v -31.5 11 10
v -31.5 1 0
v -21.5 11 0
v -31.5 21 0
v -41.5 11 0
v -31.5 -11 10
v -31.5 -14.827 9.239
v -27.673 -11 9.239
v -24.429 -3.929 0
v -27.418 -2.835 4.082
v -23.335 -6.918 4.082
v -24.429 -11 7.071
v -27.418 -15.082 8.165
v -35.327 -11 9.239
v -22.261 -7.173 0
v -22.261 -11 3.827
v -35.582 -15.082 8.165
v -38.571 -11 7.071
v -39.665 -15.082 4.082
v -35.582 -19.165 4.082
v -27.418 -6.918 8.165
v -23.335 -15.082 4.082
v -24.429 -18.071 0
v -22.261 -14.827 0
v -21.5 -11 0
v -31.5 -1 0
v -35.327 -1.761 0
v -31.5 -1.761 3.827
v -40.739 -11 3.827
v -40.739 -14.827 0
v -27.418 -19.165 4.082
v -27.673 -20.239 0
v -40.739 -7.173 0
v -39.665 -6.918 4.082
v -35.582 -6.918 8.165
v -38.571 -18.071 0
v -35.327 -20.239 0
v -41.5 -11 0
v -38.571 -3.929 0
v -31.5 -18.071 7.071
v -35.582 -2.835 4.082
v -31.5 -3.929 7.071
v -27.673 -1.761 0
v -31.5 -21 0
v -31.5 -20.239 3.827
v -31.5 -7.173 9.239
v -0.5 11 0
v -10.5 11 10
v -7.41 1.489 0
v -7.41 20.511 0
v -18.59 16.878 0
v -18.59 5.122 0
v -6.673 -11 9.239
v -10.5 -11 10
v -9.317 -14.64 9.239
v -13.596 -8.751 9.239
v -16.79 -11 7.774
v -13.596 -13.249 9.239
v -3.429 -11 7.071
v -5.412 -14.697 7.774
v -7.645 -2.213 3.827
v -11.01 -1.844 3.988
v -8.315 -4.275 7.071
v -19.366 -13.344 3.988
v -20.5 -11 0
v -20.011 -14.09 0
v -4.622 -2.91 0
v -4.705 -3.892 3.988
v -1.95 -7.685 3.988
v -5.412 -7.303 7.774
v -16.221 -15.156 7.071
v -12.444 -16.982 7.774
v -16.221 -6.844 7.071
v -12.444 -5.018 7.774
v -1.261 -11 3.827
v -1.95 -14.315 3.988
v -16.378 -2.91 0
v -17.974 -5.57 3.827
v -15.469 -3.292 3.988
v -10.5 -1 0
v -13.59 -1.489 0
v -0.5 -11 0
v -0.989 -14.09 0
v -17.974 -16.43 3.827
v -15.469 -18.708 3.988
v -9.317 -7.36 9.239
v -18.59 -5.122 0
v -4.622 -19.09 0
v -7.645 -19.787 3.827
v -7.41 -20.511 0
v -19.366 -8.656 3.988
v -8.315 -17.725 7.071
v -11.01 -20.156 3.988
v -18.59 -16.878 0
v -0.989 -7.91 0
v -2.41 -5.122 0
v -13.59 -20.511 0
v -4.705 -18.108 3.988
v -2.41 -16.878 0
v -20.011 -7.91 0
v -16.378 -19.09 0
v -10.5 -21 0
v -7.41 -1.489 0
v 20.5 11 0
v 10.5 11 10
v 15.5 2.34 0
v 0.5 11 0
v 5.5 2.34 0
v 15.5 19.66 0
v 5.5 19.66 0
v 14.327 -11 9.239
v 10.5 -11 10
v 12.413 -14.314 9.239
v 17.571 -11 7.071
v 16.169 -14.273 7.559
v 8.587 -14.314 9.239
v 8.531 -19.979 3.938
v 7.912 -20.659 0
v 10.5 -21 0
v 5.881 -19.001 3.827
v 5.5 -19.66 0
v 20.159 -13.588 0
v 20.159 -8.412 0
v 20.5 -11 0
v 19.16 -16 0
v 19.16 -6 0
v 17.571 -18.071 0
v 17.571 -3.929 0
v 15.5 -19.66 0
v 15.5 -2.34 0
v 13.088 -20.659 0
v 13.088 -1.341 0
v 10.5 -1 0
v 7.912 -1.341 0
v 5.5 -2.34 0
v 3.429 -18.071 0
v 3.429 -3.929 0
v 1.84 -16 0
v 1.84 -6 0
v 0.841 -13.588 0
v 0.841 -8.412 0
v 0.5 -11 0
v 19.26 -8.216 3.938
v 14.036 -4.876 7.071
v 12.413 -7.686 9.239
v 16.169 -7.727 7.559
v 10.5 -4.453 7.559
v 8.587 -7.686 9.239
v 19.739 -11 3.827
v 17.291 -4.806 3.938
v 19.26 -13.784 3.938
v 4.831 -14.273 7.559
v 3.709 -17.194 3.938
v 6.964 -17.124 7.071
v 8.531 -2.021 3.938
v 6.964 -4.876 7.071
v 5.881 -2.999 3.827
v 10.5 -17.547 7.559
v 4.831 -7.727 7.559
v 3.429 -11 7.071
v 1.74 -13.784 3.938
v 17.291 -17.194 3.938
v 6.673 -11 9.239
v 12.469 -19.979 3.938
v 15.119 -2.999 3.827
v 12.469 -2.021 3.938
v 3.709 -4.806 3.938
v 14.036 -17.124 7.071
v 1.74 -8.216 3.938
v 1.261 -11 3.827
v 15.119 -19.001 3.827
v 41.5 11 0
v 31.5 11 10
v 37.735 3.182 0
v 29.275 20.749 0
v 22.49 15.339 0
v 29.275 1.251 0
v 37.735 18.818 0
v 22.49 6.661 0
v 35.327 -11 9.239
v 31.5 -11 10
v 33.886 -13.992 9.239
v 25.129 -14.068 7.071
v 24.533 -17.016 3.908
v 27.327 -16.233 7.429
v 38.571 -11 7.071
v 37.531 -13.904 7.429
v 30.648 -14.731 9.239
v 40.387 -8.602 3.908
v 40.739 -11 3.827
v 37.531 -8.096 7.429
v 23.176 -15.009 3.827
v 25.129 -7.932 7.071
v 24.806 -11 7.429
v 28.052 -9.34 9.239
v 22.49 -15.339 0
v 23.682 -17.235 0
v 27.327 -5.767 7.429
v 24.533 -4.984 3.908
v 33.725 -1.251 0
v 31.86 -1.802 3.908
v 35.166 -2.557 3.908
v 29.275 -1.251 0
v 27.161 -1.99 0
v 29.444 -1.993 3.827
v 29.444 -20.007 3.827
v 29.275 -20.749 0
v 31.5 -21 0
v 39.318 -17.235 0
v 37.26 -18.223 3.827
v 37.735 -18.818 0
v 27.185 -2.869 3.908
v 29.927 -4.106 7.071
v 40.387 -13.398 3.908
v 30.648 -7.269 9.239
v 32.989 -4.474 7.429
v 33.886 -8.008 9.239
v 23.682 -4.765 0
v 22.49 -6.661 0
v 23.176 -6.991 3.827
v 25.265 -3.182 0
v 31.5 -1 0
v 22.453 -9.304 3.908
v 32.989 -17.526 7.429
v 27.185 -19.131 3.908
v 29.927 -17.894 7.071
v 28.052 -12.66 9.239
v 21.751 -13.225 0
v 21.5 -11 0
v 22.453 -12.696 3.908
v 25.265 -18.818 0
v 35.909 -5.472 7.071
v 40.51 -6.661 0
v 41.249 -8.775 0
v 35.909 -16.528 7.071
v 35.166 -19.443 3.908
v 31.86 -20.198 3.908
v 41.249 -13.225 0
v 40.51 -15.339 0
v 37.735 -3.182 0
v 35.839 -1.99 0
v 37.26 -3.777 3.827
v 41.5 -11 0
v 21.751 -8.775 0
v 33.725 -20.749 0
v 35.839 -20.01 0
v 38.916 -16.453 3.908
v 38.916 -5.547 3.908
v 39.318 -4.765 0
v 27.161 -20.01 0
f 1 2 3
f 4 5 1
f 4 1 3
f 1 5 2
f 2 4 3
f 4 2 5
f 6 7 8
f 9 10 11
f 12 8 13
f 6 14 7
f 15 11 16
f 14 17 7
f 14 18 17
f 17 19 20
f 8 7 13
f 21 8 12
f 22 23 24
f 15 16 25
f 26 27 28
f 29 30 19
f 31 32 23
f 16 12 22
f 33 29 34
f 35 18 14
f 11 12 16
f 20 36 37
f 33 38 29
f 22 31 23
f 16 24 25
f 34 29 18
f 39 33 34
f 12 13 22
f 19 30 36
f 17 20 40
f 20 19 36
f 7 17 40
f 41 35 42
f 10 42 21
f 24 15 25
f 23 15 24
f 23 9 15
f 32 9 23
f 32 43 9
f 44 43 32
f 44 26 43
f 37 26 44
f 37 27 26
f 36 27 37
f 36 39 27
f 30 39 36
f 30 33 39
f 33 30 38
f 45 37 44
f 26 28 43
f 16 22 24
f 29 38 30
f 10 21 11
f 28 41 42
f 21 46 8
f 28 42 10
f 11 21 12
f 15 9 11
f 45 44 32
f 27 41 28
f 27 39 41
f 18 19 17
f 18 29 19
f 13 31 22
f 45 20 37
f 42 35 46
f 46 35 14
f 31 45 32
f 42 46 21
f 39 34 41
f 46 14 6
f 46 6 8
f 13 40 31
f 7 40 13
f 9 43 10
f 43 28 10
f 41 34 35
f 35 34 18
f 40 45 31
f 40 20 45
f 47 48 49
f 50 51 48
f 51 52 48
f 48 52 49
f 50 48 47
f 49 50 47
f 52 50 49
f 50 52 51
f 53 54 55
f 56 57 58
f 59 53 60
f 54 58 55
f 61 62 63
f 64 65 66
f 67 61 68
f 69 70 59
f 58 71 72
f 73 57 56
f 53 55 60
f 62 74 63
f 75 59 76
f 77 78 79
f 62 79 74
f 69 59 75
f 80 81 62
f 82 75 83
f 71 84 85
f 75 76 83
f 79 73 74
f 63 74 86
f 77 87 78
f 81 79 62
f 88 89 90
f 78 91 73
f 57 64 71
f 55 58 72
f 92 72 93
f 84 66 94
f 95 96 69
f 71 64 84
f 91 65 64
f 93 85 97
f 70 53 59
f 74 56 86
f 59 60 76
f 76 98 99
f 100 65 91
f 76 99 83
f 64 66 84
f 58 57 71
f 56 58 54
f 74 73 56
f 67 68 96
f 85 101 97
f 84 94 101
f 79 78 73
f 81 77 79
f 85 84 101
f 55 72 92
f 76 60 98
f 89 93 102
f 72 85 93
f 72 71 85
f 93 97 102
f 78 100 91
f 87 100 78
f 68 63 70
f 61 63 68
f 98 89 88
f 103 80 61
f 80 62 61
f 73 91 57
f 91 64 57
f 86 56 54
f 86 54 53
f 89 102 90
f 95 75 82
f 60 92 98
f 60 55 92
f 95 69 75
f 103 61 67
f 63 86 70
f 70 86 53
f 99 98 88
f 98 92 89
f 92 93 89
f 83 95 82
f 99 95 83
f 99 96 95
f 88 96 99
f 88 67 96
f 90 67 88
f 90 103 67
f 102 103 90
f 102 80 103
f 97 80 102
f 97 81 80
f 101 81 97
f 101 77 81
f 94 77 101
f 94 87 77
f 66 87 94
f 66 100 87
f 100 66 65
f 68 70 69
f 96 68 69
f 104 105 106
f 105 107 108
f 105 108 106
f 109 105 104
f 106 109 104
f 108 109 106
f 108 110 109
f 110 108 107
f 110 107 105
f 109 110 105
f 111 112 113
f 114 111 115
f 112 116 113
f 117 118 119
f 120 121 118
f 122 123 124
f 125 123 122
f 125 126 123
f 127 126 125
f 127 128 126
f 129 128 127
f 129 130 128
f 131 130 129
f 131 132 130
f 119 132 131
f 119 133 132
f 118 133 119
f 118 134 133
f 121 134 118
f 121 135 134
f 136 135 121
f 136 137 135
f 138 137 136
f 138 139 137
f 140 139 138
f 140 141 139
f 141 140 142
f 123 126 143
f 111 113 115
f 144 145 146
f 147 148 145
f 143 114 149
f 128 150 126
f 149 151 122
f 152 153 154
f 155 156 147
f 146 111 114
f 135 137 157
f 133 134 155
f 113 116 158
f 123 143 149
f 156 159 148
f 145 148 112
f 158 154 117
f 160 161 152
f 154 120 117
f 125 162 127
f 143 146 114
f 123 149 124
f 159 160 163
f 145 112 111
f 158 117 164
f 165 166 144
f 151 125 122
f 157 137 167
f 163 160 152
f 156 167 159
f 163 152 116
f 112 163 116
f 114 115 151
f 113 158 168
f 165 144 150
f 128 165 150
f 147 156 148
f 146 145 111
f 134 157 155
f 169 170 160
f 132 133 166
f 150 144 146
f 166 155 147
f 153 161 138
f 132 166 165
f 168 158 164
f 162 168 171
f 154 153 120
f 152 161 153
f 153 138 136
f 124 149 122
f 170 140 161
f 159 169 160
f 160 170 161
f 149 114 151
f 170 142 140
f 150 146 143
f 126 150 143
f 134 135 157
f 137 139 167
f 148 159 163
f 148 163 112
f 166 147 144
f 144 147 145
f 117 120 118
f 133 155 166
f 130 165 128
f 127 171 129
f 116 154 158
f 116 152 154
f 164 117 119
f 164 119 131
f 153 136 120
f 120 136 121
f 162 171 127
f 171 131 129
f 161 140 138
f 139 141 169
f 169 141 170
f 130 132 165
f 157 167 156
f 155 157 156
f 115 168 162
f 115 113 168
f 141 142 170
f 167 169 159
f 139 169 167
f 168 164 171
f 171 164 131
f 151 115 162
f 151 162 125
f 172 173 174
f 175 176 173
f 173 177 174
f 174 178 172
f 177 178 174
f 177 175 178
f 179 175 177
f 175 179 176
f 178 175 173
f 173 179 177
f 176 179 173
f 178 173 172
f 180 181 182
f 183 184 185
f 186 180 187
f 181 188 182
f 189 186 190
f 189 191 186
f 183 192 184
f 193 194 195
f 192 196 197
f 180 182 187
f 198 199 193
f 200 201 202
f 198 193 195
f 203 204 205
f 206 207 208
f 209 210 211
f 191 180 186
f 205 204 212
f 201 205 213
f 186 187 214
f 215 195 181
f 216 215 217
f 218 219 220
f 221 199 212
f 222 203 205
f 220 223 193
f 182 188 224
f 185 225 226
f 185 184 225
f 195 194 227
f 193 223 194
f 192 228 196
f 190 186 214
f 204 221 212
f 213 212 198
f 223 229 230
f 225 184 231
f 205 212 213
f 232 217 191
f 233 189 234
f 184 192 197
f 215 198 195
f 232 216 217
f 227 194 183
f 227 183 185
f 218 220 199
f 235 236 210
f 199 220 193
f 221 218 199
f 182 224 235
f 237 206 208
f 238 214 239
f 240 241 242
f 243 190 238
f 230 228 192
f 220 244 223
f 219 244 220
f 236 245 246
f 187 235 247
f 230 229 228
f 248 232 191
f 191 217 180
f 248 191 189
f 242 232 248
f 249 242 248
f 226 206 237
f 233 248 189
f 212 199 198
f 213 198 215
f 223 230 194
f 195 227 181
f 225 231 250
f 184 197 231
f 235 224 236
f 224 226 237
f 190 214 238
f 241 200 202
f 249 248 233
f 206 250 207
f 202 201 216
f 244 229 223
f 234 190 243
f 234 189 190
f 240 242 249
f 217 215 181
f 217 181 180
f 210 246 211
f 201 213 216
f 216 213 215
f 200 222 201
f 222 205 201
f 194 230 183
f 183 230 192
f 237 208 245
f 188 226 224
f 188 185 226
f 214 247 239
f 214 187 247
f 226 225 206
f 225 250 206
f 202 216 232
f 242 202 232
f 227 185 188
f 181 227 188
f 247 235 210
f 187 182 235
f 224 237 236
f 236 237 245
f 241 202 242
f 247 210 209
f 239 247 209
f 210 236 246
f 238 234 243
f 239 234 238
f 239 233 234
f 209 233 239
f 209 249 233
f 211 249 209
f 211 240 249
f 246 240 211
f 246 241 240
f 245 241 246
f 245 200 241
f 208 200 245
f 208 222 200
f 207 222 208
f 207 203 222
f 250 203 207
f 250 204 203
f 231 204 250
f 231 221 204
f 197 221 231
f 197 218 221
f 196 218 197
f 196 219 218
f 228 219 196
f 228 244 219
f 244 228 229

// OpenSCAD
/*
Geodesic Hemisphere
by Alex Matulich, April 2021
Requires OpenSCAD version 2019.05 or greater.

On Thingiverse: https://www.thingiverse.com/thing:4816358
On Prusaprinters: https://www.prusaprinters.org/prints/129119-geodesic-hemisphere-with-regular-polygon-equator

February 2022:
* Simplifications and improvements made throughout the code by Benjamin Blankertz, particularly a better approach to finding the closest root polygon match to any $fn value requested for the hemisphere.
* Root pyramid can now have up to 7 sides (was 6), giving a few more equatorial polygon possibilities.

Subdivision functions are taken from Geodesic Sphere (icosahedral sphere) by Jamie Kawabata - https://www.thingiverse.com/thing:1484333

USAGE
-----
To use this, simply put this file in the directory where you keep .scad files, and include this line in your other .scad files:

use <geodesic_hemisphere.scad>

Use it exactly like you would use the OpenSCAD sphere() primitive, with the same parameters.

EXPLANATION
-----------
This is a hemisphere with evenly-distributed faces, and unlike an icosahedral sphere, this hemisphere is rendered so that the equator is a regular polygon that can match up with other regular polygon shapes (cylinders etc.).

The default sphere in OpenSCAD is rendered as a circle rotated around a diameter. This results in a globe-shape with longitude and latitude edges, with many wasted facets concentrated at the poles.

To get a sphere with more uniformly-spaced facets, one can subdivide the triangular faces of an icosahedron into smaller faces projected onto a circumscribed sphere. This has three problems:

1. An icosahedron doesn't have an equator, so it is difficult to match another polygonal shape to it.
2. The cross-section of a regular icosahedron can be a regular decagon (orient it with a vertex at each pole and cut through an equatorial plane), but the diameter is slightly smaller than the largest diameter of the icosahedron.
3. An icosahedron is limited in the number of sides available in the polygon equator if you cut it in half. At a minimum, an icosahedron cut in half has a 10-sided equator. Subdividing it, you can get 20 sides, 40 sides, 80 sides... 5*2^(levels+1) sides, where levels is the number of subdivision iterations (with levels=0 being the original icosahedron).

This model fixes all problems for a hemisphere, which is normally what one wants to use when matching to some other shape like a cylinder. It subdivides a pyramid (3, 4, 5, 6, or 7 sided), which results in the base of the hemisphere being a regular polygon of the specified diameter of the hemisphere. The polygon can also have a larger variety of sides: 3*2^levels, 4*2^levels, 5*2^levels, 6*2^levels or 7*2^levels. This means the number of polygon sides possible is 3, 4, 5, 6, 7, 8, 10, 12, 14, 16, 20, 24, 28, 32, 40, 48, 56, 64, 80, 96, 112, 128, 160, 192, 224, etc. (one should never need to go higher than 192 or so).
*/

// ---------- demo ----------

for(i=[4:7]) {
    // root pyramids, 4 to 7 sides
    translate([(i-5.5)*21,11,0]) geodesic_hemisphere(r=10, $fn=i);
    // subdivided pyramids
    translate([(i-5.5)*21,-11,0]) geodesic_hemisphere(r=10, $fn=4*i);
}

// ---------- generate hemisphere ----------

module geodesic_hemisphere(r=-1, d=-1) {
    rad = r > 0 ? r : d > 0 ? d/2 : 1; //radius=1 by default
    fn = $fn ? $fn : max(360/$fa, 2*PI*rad/$fs);

    // given fn, figure out best root polygon and number of levels to subdivide
    log2 = log(2.0);
    logfn = log(fn);
    minpoly = fn < 6 ? 3 : 4; // can use 3-sided if fn<=6
    maxpoly = fn > 6 ? 7 : 6;
    // pn[]=possible subdivision levels for polygon having number of sides = npoly * 2^pn
    pn = [ for(i=[minpoly:maxpoly]) (logfn-log(i))/log2 ];

    // how far the provided number of vertices will deviate from fn (bb)
    dpn = [ for(i=[0:len(pn)-1]) each
            [ abs((minpoly+i)*2^floor(pn[i]) - fn),
              abs((minpoly+i)*2^ceil(pn[i]) - fn) ] ];
    minidx = floor(argmin(dpn)/2); // get closest match

    npoly = minidx + minpoly; // sides of root polygon
    levels = floor(pn[minidx]) + argmin(dpn)%2; // subdivision levels
    //echo(requested = fn, got = npoly*2^levels, npoly = npoly);

    pyramid = [ // define a pyramid with npoly sides
        // vertices
        [ [0,0,1],         // north pole
          let(a=360/npoly) // equator
            for(i=[0:npoly-1]) [ cos(i*a), sin(i*a), 0]
        ],
        // faces
        [ [0,1,npoly], for(i=[1:npoly-1]) [0,i+1,i] ]
    ];

    // subdivide the pyramid
    subdiv_pyramid = multi_subdiv_pf(pyramid, levels);
    // create base vertices and append them
    basepts = let(lv=npoly*pow(2,levels)) [for(n=[0:lv]) let(t=n*360/lv) [cos(t), sin(t), 0]];
    hpts = concat(subdiv_pyramid[0], basepts);
    // create base face and add it
    baseface = [ let(lv=npoly*pow(2,levels), 
                     pstart=len(hpts)-lv)
                 [ for(n=[0:lv-1]) pstart+n ]
               ];
    hfcs = concat(subdiv_pyramid[1], baseface);
    // render the cap
    scale(rad) polyhedron(points=hpts, faces=hfcs);

    // ========== functions ==========
    // taken from https://www.thingiverse.com/thing:1484333 by Jamie Kawabata

    // return the index of the minimum value in an array
    function argmin(v, k=0, mem=[-1, ceil(1/0)]) = 
        (k == len(v)) ? mem[0] :
            v[k] < mem[1] ? argmin(v, k+1, [k, v[k]]) : 
            argmin(v, k+1, mem);

    // polyhedron subdivision functions

    // given two 3D points on the unit sphere, find the half-way point on the great circle (euclidean midpoint renormalized to be 1 unit away from origin)

    function midpt(p1, p2) = 
        let(mid = 0.5 * (p1 +p2))
        mid / norm(mid);
  
    // given a "struct" where pf[0] is vertices and pf[1] is faces, subdivide all faces into 4 faces by dividing each edge in half along a great circle (midpt function) and returns a struct of the same format, i.e. pf[0] is a (larger) list of vertices and pf[1] is a larger list of faces.

    function subdivpf(pf) =
        let (p=pf[0], faces=pf[1])
        [ // for each face, output six points
            [ for (f=faces) 
                let (p0 = p[f[0]], p1 = p[f[1]], p2=p[f[2]]) 
                each
                [ p0, p1, p2, midpt(p0, p1), midpt(p1, p2), midpt(p0, p2) ]
            ],
        // now, again for each face, output four faces that connect those six points
            [ for (i=[0:len(faces)-1])
                let (base = 6*i)  // points generated in multiples of 6
                each
                [[base, base+3, base+5], 
                 [base+3, base+1, base+4],
                 [base+5, base+4, base+2],
                 [base+3, base+4, base+5]
                ]
            ]
        ];

    // recursive wrapper for subdivpf that subdivides "levels" times
    function multi_subdiv_pf(pf, levels) =
        levels == 0 ? pf :
        multi_subdiv_pf(subdivpf(pf), levels-1);
}
